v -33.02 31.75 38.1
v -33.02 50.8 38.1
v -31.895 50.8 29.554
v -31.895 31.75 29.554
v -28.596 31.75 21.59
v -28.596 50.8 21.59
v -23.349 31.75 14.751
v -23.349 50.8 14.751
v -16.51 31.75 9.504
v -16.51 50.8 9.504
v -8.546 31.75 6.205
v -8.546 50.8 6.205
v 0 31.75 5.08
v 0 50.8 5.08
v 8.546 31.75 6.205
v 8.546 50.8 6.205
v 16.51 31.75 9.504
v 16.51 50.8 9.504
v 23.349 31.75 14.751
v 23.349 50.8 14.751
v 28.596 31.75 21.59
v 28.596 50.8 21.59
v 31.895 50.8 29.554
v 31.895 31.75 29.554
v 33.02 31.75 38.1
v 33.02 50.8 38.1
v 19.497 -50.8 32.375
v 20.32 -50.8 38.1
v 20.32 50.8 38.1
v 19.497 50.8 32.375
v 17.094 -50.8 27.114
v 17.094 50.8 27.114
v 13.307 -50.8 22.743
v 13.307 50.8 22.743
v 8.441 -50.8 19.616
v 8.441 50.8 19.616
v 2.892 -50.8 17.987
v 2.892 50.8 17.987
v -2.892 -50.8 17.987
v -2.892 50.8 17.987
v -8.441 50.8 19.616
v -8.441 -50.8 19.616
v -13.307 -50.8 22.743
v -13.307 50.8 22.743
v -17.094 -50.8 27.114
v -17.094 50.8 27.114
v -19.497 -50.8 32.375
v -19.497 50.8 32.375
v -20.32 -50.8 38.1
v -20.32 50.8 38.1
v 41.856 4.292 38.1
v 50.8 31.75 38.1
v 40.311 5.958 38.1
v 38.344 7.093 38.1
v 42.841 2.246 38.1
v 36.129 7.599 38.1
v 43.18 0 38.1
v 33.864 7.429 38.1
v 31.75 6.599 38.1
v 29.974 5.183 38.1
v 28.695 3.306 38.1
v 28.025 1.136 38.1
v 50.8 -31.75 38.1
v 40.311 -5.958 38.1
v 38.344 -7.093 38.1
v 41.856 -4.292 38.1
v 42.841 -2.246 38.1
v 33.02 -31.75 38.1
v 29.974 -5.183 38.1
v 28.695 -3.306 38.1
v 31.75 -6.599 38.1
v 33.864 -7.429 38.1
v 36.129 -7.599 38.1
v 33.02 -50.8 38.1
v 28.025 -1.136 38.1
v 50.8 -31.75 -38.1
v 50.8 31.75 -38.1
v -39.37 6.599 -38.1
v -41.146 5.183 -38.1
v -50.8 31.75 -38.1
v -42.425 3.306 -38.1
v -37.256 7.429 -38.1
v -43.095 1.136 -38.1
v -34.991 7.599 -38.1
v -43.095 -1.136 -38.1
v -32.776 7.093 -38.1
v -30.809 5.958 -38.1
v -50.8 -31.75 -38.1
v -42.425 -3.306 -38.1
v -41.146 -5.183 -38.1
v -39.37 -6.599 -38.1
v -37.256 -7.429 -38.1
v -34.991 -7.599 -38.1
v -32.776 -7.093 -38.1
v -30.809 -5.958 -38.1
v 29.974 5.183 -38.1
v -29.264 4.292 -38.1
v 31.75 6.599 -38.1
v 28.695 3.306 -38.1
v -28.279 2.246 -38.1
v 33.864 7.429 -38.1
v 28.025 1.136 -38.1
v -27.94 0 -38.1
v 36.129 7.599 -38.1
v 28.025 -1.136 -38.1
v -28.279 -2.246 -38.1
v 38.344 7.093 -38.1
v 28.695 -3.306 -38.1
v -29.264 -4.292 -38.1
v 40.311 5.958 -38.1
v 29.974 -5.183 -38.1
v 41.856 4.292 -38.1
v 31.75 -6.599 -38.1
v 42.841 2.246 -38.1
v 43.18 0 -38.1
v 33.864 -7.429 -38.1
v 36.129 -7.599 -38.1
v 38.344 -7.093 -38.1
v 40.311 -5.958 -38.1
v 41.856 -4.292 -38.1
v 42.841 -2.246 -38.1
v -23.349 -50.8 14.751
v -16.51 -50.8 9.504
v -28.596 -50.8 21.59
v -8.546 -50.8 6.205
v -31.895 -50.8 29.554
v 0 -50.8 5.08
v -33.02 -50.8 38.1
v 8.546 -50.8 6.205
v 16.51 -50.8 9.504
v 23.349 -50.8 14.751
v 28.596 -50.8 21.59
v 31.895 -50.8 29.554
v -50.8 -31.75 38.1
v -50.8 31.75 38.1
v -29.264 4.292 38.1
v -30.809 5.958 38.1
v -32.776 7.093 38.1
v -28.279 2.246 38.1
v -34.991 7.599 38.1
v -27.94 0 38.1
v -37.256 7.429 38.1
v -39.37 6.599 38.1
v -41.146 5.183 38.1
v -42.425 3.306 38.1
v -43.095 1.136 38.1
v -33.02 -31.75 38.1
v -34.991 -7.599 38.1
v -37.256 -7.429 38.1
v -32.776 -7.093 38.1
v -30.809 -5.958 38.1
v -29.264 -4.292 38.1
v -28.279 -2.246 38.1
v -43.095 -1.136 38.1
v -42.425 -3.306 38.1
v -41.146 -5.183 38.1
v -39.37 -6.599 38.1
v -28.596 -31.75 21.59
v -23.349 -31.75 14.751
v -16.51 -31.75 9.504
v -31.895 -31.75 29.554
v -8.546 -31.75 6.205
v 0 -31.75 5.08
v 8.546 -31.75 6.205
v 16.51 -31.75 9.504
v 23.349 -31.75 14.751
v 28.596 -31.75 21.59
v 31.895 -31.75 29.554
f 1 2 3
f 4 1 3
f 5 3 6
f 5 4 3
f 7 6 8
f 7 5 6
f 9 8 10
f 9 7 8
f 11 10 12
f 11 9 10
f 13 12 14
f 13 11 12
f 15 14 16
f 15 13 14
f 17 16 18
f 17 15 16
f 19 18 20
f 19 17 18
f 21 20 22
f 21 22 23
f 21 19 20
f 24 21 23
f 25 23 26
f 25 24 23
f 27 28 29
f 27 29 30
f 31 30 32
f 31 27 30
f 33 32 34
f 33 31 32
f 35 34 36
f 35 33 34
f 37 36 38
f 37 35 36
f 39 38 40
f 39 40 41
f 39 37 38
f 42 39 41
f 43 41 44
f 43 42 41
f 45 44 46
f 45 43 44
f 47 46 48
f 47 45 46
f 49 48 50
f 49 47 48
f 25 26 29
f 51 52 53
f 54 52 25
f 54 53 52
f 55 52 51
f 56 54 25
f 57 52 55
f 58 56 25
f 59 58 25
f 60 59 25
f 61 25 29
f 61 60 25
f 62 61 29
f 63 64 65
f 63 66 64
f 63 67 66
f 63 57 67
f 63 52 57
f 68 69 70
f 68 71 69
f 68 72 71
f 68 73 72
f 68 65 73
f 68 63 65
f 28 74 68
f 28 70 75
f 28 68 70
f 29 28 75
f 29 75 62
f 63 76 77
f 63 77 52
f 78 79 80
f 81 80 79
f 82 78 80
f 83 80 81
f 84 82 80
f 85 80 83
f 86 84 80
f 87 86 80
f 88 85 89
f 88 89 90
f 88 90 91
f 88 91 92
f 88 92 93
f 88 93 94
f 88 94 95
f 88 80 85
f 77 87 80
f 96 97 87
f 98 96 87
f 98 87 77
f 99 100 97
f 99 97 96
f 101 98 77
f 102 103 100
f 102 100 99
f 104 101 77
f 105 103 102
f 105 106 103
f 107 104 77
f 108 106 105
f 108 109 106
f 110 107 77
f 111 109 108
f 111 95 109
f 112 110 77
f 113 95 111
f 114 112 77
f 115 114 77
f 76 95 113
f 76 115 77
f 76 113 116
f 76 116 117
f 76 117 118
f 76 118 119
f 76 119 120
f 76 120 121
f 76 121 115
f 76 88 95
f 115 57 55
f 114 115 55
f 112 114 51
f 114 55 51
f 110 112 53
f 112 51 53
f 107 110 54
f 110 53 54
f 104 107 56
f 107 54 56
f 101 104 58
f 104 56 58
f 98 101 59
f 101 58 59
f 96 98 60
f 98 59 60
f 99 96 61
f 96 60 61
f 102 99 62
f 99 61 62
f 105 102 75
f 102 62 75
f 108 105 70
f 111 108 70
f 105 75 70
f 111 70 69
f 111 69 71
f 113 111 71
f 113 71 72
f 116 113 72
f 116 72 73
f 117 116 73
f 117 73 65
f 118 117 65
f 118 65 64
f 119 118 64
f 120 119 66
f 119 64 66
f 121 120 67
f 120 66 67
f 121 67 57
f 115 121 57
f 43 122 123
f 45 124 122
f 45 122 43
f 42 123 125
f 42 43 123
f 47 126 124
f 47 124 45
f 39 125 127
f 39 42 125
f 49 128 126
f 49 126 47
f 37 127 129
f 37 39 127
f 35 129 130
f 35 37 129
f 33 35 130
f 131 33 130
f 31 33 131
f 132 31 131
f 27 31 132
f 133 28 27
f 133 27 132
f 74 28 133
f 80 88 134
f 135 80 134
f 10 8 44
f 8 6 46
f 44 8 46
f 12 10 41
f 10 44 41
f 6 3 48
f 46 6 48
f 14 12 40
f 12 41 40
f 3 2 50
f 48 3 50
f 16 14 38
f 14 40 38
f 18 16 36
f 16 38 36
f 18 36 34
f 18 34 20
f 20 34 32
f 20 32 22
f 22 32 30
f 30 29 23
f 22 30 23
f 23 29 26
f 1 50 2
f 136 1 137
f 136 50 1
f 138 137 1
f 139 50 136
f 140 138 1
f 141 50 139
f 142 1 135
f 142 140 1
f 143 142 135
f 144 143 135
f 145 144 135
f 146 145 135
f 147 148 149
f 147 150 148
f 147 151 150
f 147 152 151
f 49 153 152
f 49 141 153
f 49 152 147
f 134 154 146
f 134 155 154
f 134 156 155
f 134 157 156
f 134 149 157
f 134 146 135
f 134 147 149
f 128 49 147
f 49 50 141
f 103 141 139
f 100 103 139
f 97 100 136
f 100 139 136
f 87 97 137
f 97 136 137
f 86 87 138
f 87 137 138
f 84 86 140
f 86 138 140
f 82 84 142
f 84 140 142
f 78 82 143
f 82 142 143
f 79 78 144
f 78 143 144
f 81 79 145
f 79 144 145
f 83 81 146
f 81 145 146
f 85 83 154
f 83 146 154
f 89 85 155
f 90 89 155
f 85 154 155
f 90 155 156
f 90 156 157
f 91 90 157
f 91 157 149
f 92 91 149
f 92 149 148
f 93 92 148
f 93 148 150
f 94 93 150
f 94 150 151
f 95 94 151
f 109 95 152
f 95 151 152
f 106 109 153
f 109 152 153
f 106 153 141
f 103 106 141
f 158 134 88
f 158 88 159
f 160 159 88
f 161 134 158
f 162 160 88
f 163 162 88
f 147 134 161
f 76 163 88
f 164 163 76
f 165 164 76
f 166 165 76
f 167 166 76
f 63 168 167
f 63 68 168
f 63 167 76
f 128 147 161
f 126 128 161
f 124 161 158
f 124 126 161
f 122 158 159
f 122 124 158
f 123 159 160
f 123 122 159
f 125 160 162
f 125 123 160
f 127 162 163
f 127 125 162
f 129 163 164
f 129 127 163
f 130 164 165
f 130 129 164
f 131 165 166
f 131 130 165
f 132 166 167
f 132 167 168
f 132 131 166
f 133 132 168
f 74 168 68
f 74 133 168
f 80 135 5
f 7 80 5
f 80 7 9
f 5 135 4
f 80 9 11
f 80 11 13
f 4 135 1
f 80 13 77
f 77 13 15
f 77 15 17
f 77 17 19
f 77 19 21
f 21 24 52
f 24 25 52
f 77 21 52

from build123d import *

# Parameters (mm, degrees)
F0_W     = 101.6
F0_H     = 76.2
F1_DEPTH = 31.75
F3_DEPTH = 50.8
F5_DEPTH = 76.2
F6_R     = 7.62
F7_DEPTH = 76.2


with BuildPart() as f1:
    # F0 (on Front) → F1 (new body, symmetric)
    with BuildSketch(Plane.XZ):
        Rectangle(F0_W, F0_H)
    extrude(amount=F1_DEPTH, both=True)

    # F2 (on Front) → F3 (join, symmetric)
    with BuildSketch(Plane.XZ):
        with BuildLine():
            ThreePointArc((20.32, 38.1), (0, 17.78), (-20.32, 38.1))
            Line((-20.32, 38.1), (-33.02, 38.1))
            ThreePointArc((-33.02, 38.1), (0, 5.08), (33.02, 38.1))
            Line((33.02, 38.1), (20.32, 38.1))
        make_face()
    extrude(amount=F3_DEPTH, both=True)

    # F4 (on face) → F5 (cut)
    with BuildSketch(Plane.XZ.offset(31.75)):
        with BuildLine():
            Line((20.32, 38.1), (-20.32, 38.1))
            ThreePointArc((-20.32, 38.1), (0, 17.78), (20.32, 38.1))
        make_face()
    extrude(amount=-F5_DEPTH, mode=Mode.SUBTRACT)

    # F6 (on face) → F7 (cut)
    with BuildSketch(Plane.XY.offset(38.1)):
        with Locations((-35.56, 0)):
            Circle(F6_R)
        with Locations((35.56, 0)):
            Circle(F6_R)
    extrude(amount=-F7_DEPTH, mode=Mode.SUBTRACT)


solid = f1.part
